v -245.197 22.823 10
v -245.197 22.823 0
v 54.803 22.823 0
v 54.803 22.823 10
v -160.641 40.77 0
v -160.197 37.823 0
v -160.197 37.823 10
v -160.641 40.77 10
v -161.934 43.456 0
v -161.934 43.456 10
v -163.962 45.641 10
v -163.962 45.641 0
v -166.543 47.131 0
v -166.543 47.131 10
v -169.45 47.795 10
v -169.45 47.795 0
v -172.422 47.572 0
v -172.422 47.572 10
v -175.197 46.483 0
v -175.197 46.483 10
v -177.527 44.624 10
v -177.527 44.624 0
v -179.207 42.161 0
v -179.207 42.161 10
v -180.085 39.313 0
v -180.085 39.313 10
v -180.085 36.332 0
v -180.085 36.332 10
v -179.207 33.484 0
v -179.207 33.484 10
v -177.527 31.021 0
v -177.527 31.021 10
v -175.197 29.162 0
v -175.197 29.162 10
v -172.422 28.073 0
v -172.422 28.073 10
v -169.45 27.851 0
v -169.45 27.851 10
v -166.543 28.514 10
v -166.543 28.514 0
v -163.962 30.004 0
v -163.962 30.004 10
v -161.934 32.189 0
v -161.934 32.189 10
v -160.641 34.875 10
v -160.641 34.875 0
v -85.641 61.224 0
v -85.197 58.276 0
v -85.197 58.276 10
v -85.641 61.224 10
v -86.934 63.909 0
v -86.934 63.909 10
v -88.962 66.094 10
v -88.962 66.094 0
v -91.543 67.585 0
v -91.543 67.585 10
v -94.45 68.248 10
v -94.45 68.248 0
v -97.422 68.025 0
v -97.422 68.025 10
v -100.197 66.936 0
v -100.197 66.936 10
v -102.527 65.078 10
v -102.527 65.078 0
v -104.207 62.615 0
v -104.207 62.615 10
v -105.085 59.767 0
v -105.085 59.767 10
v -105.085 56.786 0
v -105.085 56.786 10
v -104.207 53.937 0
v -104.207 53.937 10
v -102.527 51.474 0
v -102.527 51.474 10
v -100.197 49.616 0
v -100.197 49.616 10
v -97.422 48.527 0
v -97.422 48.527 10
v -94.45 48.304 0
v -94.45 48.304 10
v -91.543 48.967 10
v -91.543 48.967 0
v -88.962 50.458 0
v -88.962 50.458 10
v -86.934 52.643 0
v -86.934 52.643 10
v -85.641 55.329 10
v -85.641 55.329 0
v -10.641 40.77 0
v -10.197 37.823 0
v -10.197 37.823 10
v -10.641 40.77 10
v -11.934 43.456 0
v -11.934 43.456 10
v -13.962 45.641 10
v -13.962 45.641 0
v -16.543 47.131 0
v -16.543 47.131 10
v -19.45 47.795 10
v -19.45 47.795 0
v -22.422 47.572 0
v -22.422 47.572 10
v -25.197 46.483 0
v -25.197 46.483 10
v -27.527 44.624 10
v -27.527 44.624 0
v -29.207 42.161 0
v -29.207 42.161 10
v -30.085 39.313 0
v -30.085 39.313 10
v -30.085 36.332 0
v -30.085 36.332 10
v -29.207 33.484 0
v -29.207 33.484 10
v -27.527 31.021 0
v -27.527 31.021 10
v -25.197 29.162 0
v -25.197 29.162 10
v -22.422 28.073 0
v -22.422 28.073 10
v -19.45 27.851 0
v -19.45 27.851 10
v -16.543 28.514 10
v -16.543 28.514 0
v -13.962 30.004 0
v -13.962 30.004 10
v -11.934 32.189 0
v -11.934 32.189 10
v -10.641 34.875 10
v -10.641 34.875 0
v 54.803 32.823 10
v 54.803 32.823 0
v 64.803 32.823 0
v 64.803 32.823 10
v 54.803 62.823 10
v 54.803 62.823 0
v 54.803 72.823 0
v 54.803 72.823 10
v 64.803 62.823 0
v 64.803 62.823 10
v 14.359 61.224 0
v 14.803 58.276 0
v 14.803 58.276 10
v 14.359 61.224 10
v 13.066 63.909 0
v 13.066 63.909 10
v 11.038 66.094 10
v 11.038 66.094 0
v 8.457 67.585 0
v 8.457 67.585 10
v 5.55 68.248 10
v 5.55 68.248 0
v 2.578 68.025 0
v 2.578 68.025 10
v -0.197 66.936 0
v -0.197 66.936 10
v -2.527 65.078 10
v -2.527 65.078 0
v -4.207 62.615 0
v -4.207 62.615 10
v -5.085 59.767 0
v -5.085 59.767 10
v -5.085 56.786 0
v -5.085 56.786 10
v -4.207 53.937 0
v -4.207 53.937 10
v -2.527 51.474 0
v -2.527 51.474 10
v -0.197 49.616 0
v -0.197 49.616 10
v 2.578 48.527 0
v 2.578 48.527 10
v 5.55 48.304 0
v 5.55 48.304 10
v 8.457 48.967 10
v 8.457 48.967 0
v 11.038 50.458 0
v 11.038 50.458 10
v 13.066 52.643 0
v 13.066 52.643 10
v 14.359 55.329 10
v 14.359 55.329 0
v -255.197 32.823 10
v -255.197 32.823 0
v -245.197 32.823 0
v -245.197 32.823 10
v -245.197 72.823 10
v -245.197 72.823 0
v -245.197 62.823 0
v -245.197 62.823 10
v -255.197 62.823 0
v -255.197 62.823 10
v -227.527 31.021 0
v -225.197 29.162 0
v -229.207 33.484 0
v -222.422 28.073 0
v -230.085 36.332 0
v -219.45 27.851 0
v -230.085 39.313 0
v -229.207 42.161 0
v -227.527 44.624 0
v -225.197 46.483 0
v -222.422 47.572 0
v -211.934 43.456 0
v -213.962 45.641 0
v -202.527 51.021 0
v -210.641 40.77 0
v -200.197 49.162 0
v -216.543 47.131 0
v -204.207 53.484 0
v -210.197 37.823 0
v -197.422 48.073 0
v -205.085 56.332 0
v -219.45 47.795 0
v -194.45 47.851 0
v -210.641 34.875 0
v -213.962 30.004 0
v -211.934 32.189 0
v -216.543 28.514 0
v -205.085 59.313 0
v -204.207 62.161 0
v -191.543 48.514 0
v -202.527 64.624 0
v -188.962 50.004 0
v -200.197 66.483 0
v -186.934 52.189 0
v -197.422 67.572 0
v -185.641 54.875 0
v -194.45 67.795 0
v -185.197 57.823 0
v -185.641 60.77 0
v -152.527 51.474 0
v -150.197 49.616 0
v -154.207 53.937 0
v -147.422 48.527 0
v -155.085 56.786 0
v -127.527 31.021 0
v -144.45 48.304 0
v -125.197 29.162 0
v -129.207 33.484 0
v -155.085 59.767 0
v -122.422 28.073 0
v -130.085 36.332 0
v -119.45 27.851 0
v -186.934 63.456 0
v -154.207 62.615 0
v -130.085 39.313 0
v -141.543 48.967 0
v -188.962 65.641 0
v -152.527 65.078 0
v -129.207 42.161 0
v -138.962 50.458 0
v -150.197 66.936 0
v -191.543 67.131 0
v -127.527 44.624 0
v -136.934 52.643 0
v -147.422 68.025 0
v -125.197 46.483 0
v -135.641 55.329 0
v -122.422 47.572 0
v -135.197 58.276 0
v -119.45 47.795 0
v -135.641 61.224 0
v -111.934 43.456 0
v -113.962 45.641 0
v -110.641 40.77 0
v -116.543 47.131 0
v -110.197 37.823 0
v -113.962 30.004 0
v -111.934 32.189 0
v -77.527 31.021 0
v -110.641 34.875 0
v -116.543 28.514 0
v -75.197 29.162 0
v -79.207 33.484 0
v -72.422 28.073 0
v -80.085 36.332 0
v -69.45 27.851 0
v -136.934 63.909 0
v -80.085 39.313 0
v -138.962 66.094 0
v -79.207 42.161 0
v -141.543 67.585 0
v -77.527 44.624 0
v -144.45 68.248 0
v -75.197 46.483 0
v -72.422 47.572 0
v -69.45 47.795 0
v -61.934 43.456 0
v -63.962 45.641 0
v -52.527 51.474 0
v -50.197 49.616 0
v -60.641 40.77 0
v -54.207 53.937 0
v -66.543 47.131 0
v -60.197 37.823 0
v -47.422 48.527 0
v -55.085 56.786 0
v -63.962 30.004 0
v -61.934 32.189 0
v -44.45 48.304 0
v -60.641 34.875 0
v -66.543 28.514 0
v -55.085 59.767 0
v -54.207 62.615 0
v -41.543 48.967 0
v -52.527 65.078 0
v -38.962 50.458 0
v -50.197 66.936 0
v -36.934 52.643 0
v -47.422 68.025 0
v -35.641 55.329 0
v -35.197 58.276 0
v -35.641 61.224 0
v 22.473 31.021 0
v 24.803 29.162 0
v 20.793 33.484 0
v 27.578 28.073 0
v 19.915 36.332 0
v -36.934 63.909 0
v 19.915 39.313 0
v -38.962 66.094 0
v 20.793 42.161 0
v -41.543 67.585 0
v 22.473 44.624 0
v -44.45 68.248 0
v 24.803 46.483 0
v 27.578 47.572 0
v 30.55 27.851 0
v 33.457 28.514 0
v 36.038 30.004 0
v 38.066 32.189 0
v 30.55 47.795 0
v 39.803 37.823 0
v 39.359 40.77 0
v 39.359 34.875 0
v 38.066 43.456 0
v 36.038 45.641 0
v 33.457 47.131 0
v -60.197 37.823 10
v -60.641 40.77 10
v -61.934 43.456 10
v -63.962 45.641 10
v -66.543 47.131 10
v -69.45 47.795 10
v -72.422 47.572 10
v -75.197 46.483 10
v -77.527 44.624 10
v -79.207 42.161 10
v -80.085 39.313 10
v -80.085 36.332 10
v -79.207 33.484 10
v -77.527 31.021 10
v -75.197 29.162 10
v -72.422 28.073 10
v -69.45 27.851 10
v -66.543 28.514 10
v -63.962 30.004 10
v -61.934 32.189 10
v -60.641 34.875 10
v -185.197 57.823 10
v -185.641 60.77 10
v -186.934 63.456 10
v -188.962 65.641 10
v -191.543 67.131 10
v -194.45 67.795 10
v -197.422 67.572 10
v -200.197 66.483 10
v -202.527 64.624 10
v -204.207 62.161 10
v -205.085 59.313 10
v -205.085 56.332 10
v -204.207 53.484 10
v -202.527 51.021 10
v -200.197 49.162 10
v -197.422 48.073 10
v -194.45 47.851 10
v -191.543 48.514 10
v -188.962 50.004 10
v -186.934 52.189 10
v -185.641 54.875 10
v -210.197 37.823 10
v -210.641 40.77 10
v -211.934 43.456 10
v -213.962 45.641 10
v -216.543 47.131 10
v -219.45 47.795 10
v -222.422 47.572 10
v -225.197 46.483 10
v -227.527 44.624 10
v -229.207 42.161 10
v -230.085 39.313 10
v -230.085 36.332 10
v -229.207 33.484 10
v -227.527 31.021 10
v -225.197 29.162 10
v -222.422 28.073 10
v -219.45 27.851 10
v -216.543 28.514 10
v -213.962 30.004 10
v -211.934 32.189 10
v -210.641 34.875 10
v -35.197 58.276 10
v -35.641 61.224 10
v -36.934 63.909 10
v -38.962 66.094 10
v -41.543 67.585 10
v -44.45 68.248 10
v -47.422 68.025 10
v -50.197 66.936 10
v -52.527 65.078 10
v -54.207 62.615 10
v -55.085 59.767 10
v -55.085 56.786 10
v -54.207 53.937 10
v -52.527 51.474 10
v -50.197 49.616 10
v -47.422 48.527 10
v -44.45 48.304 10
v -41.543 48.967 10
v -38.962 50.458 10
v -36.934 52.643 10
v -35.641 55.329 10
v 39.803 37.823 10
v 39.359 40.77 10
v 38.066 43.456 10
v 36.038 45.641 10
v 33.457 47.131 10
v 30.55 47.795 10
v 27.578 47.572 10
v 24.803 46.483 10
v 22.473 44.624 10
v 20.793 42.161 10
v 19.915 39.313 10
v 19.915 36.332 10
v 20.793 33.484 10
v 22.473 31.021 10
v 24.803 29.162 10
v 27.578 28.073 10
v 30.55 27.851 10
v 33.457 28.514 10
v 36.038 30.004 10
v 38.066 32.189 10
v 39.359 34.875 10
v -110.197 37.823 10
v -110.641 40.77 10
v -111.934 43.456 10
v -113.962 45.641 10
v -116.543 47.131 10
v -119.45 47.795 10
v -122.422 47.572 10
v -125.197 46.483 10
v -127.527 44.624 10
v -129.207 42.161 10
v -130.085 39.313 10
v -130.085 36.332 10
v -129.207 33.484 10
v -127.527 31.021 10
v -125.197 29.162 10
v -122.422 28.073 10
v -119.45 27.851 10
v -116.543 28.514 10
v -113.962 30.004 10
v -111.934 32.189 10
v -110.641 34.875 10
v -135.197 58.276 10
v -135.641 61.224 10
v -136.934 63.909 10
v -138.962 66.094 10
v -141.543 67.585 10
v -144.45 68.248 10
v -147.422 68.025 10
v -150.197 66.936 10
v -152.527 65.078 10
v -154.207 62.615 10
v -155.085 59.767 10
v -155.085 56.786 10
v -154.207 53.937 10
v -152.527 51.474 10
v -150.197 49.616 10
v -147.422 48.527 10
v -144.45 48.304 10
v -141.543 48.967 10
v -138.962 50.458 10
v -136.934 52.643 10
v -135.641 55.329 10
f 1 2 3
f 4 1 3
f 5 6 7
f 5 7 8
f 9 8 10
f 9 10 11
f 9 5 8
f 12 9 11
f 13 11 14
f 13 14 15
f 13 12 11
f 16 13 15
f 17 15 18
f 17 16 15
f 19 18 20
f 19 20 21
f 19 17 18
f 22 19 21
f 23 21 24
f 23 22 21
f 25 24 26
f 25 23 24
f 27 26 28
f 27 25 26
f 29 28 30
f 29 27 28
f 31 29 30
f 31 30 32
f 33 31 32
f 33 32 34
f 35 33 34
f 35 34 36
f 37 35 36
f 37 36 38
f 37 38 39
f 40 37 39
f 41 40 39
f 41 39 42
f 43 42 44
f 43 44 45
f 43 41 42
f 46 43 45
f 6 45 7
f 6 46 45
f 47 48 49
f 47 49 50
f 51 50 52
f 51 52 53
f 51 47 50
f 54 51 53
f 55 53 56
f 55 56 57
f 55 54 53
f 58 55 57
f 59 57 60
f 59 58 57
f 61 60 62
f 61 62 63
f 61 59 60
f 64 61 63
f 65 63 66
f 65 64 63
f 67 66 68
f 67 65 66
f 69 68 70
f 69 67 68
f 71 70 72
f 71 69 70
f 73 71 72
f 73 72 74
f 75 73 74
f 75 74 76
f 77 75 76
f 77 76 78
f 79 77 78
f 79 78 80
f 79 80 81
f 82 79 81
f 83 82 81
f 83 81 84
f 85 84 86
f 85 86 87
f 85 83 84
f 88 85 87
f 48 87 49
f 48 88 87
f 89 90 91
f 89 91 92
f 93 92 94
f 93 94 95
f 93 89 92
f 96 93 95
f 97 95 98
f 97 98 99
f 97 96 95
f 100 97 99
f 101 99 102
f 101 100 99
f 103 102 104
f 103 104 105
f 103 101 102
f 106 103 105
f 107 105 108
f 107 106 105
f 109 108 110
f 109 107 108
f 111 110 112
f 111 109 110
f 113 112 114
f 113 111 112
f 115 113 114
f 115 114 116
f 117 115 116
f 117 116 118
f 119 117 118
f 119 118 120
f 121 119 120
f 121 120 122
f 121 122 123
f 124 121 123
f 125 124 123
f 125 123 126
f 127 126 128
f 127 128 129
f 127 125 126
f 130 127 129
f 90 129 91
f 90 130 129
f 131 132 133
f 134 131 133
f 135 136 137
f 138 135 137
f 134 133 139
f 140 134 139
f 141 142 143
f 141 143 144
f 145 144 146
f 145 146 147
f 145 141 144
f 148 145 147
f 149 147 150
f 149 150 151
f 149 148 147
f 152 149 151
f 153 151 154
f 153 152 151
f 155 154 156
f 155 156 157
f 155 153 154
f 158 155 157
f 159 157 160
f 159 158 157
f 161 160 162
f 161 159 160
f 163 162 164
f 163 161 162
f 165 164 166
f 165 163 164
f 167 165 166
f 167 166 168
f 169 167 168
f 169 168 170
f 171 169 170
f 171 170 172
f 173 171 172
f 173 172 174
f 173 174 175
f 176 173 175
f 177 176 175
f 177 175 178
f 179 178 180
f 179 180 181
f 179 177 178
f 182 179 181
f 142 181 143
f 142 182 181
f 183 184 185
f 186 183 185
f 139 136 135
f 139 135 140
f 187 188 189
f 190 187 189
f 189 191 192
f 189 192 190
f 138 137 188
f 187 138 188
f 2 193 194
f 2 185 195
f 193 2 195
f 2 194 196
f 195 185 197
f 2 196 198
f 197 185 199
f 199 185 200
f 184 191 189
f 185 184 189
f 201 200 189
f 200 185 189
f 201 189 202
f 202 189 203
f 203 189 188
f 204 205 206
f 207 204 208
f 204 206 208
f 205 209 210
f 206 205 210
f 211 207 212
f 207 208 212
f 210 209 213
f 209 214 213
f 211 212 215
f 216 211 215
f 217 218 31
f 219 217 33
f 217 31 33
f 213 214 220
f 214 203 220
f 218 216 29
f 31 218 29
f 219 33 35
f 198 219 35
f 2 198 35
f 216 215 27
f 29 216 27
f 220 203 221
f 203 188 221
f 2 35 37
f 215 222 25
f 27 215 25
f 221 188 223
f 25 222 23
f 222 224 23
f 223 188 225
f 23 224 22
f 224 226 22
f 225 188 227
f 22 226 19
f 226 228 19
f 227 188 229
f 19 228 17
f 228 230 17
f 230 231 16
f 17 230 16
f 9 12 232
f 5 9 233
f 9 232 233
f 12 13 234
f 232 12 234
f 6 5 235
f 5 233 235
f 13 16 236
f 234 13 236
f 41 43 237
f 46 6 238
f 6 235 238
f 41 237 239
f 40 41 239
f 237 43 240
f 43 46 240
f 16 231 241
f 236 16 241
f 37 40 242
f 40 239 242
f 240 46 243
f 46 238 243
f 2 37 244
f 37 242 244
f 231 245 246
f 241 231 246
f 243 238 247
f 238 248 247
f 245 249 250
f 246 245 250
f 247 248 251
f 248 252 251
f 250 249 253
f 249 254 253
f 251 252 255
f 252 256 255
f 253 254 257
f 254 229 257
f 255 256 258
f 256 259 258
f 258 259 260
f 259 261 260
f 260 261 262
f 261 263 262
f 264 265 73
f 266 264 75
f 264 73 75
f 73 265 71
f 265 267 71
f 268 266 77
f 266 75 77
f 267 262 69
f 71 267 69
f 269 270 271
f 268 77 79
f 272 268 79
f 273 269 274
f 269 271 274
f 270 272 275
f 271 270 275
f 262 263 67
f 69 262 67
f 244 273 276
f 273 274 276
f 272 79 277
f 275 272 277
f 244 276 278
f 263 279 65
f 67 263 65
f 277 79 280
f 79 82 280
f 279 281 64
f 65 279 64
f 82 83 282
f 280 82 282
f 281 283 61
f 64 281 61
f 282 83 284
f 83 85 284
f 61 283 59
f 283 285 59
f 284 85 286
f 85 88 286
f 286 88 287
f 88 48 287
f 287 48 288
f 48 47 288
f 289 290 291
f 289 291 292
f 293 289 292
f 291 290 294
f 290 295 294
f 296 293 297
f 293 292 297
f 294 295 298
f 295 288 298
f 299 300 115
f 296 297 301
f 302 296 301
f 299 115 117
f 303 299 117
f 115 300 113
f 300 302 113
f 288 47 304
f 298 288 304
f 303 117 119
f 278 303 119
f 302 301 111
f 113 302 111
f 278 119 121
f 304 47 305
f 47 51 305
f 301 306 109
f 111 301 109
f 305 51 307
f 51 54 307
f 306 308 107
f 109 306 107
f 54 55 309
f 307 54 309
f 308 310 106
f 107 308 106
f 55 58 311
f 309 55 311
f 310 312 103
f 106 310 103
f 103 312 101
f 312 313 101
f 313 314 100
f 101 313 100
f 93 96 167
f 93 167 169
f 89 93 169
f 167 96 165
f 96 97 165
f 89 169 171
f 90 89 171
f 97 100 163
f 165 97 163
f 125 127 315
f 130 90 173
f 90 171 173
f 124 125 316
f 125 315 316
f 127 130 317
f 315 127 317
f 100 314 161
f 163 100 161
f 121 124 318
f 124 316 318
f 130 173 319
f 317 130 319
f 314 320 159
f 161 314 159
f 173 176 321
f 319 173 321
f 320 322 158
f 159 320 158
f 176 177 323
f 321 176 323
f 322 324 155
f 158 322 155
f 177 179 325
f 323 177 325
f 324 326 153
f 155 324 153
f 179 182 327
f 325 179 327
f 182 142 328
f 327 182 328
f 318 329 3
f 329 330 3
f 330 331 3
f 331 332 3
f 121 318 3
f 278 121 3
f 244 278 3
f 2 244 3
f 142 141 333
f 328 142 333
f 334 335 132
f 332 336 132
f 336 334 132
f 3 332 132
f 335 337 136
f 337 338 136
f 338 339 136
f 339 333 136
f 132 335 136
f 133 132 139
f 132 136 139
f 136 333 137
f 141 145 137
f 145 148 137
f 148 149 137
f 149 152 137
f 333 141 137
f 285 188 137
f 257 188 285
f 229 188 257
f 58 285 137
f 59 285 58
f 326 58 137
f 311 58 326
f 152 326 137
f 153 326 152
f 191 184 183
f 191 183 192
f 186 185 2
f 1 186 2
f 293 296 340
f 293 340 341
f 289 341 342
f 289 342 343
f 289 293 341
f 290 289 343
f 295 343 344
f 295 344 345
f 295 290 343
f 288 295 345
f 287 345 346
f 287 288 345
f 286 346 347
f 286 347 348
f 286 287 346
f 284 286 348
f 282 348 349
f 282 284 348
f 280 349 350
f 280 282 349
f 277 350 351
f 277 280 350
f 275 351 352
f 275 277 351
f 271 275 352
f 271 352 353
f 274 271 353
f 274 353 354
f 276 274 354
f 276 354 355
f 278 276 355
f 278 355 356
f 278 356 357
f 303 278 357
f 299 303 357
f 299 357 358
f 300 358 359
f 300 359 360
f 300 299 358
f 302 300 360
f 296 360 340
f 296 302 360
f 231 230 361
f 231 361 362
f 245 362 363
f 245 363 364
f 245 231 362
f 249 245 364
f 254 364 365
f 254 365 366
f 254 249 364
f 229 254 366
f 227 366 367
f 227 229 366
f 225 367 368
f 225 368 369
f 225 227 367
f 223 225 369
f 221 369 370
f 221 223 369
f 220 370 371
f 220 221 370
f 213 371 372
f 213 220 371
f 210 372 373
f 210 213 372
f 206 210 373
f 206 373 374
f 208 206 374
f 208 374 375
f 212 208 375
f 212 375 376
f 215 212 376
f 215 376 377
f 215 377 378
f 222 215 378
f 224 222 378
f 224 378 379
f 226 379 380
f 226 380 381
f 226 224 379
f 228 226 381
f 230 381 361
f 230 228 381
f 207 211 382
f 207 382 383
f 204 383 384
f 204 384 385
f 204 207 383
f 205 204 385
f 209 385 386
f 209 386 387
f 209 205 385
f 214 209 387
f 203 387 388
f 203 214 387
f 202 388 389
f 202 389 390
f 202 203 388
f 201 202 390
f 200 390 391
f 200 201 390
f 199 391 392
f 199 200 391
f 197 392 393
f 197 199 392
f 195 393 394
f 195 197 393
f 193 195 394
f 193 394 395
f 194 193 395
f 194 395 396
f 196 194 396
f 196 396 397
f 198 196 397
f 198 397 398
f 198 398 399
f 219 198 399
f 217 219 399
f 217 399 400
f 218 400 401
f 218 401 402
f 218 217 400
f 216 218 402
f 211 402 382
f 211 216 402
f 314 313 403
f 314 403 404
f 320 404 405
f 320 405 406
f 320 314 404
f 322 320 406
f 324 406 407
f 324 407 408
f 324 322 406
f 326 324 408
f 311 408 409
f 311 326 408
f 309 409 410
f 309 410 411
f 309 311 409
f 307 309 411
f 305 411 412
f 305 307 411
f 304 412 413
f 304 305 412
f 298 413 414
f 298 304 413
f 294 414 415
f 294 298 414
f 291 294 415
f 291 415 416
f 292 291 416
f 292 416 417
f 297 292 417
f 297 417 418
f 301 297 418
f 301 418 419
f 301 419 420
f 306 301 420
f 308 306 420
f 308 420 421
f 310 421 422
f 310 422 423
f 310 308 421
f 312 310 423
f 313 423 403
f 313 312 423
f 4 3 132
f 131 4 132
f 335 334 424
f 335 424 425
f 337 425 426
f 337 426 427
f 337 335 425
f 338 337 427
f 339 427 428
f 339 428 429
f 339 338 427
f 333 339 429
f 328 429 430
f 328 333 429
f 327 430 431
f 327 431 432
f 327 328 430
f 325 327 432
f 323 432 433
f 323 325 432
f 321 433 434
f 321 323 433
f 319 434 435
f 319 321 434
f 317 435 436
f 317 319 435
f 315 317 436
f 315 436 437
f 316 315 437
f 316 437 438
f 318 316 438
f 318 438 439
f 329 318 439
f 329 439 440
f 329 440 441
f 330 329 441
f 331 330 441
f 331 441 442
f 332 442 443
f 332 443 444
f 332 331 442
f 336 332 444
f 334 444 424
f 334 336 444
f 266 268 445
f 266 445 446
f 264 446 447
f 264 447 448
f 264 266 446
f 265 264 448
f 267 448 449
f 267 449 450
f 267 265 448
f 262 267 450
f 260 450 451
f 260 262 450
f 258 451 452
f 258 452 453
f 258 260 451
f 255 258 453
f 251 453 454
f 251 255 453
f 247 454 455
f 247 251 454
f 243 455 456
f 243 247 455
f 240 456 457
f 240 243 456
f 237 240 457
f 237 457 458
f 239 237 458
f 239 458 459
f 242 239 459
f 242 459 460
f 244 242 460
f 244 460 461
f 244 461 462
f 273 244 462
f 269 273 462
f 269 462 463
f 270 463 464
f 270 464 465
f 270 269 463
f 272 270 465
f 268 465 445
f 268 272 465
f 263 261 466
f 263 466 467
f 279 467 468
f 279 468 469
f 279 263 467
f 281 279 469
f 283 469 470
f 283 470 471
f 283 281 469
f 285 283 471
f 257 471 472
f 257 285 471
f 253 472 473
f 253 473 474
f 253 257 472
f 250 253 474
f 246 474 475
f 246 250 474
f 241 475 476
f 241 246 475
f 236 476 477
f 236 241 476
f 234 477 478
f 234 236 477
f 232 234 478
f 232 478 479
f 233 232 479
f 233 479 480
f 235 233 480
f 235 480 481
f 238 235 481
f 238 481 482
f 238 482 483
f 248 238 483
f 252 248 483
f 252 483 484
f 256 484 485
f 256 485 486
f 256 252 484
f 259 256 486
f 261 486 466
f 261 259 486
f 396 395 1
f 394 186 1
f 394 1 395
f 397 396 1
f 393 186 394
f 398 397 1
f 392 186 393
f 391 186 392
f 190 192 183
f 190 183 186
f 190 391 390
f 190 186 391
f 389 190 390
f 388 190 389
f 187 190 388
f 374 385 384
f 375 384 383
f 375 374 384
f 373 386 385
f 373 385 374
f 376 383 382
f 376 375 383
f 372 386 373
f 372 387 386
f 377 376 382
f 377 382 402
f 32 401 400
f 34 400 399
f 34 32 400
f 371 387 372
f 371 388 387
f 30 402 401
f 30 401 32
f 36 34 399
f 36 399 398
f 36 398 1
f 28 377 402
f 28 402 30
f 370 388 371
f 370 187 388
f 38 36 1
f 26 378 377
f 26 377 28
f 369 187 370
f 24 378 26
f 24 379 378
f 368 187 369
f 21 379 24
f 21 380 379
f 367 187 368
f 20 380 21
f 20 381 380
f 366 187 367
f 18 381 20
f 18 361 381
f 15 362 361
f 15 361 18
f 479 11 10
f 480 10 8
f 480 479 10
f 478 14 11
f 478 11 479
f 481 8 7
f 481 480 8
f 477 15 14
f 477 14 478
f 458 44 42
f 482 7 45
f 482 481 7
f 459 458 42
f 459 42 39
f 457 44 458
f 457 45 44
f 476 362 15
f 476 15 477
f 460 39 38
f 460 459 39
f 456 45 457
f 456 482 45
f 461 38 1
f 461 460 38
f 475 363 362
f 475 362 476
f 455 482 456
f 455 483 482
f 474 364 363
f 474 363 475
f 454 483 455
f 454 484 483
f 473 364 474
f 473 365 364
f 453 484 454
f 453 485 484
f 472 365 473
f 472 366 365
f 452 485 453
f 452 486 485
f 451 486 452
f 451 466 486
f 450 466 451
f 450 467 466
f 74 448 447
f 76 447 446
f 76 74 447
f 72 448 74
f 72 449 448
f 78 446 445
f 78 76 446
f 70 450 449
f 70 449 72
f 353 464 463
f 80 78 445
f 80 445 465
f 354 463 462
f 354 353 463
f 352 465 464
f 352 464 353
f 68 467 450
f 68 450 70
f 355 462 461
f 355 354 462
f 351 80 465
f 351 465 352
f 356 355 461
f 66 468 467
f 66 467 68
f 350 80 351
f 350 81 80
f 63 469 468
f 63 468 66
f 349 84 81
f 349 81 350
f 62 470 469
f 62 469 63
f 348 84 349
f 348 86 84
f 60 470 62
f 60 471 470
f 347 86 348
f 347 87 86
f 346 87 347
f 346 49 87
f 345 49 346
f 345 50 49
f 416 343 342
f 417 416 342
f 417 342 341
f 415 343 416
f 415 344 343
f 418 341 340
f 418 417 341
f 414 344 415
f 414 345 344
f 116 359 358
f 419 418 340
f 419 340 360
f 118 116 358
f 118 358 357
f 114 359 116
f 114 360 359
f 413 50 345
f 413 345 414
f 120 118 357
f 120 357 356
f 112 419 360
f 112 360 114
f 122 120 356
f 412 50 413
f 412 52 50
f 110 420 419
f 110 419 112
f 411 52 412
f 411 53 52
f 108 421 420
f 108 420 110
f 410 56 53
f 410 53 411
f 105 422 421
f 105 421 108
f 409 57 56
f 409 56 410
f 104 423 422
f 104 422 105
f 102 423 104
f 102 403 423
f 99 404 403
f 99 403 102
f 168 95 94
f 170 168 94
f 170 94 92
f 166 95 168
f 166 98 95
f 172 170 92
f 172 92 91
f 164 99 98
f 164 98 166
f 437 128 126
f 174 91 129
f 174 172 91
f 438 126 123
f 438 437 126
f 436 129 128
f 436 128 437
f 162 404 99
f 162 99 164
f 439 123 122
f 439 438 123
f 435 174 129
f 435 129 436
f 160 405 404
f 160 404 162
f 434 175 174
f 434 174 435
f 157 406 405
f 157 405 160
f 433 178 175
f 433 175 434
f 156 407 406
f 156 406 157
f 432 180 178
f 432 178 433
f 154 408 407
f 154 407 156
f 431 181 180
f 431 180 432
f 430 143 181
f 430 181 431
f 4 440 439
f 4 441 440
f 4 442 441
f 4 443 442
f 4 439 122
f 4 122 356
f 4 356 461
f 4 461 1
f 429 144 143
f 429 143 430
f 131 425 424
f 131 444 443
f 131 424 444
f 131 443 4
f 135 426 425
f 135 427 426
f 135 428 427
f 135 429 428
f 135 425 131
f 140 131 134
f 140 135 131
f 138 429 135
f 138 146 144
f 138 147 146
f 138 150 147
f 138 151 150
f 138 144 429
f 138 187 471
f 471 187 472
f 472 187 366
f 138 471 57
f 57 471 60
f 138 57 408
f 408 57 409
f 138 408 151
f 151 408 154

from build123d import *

# Parameters (mm, degrees)
F0_R     = 10
F0_W     = 10
F0_H     = 30
F1_DEPTH = 10


with BuildPart() as f1:
    # F0 (on Top) → F1 (new body)
    with BuildSketch(Plane.XY):
        Polygon((-245.196861, 22.822646), (54.803139, 22.822646), (54.803139, 32.822646), (54.803139, 62.822646), (54.803139, 72.822646), (-245.196861, 72.822646), (-245.196861, 62.822646), (-245.196861, 32.822646), align=None)
        with Locations((-220.196861, 37.822646)):
            Circle(F0_R, mode=Mode.SUBTRACT)
        with Locations((-170.196861, 37.822646)):
            Circle(F0_R, mode=Mode.SUBTRACT)
        with Locations((-120.196861, 37.822646)):
            Circle(F0_R, mode=Mode.SUBTRACT)
        with Locations((-70.196861, 37.822646)):
            Circle(F0_R, mode=Mode.SUBTRACT)
        with Locations((-20.196861, 37.822646)):
            Circle(F0_R, mode=Mode.SUBTRACT)
        with Locations((29.803139, 37.822646)):
            Circle(F0_R, mode=Mode.SUBTRACT)
        with Locations((-195.196861, 57.822646)):
            Circle(F0_R, mode=Mode.SUBTRACT)
        with Locations((-145.196861, 58.276102)):
            Circle(F0_R, mode=Mode.SUBTRACT)
        with Locations((-95.196861, 58.276102)):
            Circle(F0_R, mode=Mode.SUBTRACT)
        with Locations((-45.196861, 58.276102)):
            Circle(F0_R, mode=Mode.SUBTRACT)
        with Locations((4.803139, 58.276102)):
            Circle(F0_R, mode=Mode.SUBTRACT)
        with Locations((-250.196861, 47.822646)):
            Rectangle(F0_W, F0_H)
        with Locations((59.803139, 47.822646)):
            Rectangle(F0_W, F0_H)
    extrude(amount=F1_DEPTH)


solid = f1.part
